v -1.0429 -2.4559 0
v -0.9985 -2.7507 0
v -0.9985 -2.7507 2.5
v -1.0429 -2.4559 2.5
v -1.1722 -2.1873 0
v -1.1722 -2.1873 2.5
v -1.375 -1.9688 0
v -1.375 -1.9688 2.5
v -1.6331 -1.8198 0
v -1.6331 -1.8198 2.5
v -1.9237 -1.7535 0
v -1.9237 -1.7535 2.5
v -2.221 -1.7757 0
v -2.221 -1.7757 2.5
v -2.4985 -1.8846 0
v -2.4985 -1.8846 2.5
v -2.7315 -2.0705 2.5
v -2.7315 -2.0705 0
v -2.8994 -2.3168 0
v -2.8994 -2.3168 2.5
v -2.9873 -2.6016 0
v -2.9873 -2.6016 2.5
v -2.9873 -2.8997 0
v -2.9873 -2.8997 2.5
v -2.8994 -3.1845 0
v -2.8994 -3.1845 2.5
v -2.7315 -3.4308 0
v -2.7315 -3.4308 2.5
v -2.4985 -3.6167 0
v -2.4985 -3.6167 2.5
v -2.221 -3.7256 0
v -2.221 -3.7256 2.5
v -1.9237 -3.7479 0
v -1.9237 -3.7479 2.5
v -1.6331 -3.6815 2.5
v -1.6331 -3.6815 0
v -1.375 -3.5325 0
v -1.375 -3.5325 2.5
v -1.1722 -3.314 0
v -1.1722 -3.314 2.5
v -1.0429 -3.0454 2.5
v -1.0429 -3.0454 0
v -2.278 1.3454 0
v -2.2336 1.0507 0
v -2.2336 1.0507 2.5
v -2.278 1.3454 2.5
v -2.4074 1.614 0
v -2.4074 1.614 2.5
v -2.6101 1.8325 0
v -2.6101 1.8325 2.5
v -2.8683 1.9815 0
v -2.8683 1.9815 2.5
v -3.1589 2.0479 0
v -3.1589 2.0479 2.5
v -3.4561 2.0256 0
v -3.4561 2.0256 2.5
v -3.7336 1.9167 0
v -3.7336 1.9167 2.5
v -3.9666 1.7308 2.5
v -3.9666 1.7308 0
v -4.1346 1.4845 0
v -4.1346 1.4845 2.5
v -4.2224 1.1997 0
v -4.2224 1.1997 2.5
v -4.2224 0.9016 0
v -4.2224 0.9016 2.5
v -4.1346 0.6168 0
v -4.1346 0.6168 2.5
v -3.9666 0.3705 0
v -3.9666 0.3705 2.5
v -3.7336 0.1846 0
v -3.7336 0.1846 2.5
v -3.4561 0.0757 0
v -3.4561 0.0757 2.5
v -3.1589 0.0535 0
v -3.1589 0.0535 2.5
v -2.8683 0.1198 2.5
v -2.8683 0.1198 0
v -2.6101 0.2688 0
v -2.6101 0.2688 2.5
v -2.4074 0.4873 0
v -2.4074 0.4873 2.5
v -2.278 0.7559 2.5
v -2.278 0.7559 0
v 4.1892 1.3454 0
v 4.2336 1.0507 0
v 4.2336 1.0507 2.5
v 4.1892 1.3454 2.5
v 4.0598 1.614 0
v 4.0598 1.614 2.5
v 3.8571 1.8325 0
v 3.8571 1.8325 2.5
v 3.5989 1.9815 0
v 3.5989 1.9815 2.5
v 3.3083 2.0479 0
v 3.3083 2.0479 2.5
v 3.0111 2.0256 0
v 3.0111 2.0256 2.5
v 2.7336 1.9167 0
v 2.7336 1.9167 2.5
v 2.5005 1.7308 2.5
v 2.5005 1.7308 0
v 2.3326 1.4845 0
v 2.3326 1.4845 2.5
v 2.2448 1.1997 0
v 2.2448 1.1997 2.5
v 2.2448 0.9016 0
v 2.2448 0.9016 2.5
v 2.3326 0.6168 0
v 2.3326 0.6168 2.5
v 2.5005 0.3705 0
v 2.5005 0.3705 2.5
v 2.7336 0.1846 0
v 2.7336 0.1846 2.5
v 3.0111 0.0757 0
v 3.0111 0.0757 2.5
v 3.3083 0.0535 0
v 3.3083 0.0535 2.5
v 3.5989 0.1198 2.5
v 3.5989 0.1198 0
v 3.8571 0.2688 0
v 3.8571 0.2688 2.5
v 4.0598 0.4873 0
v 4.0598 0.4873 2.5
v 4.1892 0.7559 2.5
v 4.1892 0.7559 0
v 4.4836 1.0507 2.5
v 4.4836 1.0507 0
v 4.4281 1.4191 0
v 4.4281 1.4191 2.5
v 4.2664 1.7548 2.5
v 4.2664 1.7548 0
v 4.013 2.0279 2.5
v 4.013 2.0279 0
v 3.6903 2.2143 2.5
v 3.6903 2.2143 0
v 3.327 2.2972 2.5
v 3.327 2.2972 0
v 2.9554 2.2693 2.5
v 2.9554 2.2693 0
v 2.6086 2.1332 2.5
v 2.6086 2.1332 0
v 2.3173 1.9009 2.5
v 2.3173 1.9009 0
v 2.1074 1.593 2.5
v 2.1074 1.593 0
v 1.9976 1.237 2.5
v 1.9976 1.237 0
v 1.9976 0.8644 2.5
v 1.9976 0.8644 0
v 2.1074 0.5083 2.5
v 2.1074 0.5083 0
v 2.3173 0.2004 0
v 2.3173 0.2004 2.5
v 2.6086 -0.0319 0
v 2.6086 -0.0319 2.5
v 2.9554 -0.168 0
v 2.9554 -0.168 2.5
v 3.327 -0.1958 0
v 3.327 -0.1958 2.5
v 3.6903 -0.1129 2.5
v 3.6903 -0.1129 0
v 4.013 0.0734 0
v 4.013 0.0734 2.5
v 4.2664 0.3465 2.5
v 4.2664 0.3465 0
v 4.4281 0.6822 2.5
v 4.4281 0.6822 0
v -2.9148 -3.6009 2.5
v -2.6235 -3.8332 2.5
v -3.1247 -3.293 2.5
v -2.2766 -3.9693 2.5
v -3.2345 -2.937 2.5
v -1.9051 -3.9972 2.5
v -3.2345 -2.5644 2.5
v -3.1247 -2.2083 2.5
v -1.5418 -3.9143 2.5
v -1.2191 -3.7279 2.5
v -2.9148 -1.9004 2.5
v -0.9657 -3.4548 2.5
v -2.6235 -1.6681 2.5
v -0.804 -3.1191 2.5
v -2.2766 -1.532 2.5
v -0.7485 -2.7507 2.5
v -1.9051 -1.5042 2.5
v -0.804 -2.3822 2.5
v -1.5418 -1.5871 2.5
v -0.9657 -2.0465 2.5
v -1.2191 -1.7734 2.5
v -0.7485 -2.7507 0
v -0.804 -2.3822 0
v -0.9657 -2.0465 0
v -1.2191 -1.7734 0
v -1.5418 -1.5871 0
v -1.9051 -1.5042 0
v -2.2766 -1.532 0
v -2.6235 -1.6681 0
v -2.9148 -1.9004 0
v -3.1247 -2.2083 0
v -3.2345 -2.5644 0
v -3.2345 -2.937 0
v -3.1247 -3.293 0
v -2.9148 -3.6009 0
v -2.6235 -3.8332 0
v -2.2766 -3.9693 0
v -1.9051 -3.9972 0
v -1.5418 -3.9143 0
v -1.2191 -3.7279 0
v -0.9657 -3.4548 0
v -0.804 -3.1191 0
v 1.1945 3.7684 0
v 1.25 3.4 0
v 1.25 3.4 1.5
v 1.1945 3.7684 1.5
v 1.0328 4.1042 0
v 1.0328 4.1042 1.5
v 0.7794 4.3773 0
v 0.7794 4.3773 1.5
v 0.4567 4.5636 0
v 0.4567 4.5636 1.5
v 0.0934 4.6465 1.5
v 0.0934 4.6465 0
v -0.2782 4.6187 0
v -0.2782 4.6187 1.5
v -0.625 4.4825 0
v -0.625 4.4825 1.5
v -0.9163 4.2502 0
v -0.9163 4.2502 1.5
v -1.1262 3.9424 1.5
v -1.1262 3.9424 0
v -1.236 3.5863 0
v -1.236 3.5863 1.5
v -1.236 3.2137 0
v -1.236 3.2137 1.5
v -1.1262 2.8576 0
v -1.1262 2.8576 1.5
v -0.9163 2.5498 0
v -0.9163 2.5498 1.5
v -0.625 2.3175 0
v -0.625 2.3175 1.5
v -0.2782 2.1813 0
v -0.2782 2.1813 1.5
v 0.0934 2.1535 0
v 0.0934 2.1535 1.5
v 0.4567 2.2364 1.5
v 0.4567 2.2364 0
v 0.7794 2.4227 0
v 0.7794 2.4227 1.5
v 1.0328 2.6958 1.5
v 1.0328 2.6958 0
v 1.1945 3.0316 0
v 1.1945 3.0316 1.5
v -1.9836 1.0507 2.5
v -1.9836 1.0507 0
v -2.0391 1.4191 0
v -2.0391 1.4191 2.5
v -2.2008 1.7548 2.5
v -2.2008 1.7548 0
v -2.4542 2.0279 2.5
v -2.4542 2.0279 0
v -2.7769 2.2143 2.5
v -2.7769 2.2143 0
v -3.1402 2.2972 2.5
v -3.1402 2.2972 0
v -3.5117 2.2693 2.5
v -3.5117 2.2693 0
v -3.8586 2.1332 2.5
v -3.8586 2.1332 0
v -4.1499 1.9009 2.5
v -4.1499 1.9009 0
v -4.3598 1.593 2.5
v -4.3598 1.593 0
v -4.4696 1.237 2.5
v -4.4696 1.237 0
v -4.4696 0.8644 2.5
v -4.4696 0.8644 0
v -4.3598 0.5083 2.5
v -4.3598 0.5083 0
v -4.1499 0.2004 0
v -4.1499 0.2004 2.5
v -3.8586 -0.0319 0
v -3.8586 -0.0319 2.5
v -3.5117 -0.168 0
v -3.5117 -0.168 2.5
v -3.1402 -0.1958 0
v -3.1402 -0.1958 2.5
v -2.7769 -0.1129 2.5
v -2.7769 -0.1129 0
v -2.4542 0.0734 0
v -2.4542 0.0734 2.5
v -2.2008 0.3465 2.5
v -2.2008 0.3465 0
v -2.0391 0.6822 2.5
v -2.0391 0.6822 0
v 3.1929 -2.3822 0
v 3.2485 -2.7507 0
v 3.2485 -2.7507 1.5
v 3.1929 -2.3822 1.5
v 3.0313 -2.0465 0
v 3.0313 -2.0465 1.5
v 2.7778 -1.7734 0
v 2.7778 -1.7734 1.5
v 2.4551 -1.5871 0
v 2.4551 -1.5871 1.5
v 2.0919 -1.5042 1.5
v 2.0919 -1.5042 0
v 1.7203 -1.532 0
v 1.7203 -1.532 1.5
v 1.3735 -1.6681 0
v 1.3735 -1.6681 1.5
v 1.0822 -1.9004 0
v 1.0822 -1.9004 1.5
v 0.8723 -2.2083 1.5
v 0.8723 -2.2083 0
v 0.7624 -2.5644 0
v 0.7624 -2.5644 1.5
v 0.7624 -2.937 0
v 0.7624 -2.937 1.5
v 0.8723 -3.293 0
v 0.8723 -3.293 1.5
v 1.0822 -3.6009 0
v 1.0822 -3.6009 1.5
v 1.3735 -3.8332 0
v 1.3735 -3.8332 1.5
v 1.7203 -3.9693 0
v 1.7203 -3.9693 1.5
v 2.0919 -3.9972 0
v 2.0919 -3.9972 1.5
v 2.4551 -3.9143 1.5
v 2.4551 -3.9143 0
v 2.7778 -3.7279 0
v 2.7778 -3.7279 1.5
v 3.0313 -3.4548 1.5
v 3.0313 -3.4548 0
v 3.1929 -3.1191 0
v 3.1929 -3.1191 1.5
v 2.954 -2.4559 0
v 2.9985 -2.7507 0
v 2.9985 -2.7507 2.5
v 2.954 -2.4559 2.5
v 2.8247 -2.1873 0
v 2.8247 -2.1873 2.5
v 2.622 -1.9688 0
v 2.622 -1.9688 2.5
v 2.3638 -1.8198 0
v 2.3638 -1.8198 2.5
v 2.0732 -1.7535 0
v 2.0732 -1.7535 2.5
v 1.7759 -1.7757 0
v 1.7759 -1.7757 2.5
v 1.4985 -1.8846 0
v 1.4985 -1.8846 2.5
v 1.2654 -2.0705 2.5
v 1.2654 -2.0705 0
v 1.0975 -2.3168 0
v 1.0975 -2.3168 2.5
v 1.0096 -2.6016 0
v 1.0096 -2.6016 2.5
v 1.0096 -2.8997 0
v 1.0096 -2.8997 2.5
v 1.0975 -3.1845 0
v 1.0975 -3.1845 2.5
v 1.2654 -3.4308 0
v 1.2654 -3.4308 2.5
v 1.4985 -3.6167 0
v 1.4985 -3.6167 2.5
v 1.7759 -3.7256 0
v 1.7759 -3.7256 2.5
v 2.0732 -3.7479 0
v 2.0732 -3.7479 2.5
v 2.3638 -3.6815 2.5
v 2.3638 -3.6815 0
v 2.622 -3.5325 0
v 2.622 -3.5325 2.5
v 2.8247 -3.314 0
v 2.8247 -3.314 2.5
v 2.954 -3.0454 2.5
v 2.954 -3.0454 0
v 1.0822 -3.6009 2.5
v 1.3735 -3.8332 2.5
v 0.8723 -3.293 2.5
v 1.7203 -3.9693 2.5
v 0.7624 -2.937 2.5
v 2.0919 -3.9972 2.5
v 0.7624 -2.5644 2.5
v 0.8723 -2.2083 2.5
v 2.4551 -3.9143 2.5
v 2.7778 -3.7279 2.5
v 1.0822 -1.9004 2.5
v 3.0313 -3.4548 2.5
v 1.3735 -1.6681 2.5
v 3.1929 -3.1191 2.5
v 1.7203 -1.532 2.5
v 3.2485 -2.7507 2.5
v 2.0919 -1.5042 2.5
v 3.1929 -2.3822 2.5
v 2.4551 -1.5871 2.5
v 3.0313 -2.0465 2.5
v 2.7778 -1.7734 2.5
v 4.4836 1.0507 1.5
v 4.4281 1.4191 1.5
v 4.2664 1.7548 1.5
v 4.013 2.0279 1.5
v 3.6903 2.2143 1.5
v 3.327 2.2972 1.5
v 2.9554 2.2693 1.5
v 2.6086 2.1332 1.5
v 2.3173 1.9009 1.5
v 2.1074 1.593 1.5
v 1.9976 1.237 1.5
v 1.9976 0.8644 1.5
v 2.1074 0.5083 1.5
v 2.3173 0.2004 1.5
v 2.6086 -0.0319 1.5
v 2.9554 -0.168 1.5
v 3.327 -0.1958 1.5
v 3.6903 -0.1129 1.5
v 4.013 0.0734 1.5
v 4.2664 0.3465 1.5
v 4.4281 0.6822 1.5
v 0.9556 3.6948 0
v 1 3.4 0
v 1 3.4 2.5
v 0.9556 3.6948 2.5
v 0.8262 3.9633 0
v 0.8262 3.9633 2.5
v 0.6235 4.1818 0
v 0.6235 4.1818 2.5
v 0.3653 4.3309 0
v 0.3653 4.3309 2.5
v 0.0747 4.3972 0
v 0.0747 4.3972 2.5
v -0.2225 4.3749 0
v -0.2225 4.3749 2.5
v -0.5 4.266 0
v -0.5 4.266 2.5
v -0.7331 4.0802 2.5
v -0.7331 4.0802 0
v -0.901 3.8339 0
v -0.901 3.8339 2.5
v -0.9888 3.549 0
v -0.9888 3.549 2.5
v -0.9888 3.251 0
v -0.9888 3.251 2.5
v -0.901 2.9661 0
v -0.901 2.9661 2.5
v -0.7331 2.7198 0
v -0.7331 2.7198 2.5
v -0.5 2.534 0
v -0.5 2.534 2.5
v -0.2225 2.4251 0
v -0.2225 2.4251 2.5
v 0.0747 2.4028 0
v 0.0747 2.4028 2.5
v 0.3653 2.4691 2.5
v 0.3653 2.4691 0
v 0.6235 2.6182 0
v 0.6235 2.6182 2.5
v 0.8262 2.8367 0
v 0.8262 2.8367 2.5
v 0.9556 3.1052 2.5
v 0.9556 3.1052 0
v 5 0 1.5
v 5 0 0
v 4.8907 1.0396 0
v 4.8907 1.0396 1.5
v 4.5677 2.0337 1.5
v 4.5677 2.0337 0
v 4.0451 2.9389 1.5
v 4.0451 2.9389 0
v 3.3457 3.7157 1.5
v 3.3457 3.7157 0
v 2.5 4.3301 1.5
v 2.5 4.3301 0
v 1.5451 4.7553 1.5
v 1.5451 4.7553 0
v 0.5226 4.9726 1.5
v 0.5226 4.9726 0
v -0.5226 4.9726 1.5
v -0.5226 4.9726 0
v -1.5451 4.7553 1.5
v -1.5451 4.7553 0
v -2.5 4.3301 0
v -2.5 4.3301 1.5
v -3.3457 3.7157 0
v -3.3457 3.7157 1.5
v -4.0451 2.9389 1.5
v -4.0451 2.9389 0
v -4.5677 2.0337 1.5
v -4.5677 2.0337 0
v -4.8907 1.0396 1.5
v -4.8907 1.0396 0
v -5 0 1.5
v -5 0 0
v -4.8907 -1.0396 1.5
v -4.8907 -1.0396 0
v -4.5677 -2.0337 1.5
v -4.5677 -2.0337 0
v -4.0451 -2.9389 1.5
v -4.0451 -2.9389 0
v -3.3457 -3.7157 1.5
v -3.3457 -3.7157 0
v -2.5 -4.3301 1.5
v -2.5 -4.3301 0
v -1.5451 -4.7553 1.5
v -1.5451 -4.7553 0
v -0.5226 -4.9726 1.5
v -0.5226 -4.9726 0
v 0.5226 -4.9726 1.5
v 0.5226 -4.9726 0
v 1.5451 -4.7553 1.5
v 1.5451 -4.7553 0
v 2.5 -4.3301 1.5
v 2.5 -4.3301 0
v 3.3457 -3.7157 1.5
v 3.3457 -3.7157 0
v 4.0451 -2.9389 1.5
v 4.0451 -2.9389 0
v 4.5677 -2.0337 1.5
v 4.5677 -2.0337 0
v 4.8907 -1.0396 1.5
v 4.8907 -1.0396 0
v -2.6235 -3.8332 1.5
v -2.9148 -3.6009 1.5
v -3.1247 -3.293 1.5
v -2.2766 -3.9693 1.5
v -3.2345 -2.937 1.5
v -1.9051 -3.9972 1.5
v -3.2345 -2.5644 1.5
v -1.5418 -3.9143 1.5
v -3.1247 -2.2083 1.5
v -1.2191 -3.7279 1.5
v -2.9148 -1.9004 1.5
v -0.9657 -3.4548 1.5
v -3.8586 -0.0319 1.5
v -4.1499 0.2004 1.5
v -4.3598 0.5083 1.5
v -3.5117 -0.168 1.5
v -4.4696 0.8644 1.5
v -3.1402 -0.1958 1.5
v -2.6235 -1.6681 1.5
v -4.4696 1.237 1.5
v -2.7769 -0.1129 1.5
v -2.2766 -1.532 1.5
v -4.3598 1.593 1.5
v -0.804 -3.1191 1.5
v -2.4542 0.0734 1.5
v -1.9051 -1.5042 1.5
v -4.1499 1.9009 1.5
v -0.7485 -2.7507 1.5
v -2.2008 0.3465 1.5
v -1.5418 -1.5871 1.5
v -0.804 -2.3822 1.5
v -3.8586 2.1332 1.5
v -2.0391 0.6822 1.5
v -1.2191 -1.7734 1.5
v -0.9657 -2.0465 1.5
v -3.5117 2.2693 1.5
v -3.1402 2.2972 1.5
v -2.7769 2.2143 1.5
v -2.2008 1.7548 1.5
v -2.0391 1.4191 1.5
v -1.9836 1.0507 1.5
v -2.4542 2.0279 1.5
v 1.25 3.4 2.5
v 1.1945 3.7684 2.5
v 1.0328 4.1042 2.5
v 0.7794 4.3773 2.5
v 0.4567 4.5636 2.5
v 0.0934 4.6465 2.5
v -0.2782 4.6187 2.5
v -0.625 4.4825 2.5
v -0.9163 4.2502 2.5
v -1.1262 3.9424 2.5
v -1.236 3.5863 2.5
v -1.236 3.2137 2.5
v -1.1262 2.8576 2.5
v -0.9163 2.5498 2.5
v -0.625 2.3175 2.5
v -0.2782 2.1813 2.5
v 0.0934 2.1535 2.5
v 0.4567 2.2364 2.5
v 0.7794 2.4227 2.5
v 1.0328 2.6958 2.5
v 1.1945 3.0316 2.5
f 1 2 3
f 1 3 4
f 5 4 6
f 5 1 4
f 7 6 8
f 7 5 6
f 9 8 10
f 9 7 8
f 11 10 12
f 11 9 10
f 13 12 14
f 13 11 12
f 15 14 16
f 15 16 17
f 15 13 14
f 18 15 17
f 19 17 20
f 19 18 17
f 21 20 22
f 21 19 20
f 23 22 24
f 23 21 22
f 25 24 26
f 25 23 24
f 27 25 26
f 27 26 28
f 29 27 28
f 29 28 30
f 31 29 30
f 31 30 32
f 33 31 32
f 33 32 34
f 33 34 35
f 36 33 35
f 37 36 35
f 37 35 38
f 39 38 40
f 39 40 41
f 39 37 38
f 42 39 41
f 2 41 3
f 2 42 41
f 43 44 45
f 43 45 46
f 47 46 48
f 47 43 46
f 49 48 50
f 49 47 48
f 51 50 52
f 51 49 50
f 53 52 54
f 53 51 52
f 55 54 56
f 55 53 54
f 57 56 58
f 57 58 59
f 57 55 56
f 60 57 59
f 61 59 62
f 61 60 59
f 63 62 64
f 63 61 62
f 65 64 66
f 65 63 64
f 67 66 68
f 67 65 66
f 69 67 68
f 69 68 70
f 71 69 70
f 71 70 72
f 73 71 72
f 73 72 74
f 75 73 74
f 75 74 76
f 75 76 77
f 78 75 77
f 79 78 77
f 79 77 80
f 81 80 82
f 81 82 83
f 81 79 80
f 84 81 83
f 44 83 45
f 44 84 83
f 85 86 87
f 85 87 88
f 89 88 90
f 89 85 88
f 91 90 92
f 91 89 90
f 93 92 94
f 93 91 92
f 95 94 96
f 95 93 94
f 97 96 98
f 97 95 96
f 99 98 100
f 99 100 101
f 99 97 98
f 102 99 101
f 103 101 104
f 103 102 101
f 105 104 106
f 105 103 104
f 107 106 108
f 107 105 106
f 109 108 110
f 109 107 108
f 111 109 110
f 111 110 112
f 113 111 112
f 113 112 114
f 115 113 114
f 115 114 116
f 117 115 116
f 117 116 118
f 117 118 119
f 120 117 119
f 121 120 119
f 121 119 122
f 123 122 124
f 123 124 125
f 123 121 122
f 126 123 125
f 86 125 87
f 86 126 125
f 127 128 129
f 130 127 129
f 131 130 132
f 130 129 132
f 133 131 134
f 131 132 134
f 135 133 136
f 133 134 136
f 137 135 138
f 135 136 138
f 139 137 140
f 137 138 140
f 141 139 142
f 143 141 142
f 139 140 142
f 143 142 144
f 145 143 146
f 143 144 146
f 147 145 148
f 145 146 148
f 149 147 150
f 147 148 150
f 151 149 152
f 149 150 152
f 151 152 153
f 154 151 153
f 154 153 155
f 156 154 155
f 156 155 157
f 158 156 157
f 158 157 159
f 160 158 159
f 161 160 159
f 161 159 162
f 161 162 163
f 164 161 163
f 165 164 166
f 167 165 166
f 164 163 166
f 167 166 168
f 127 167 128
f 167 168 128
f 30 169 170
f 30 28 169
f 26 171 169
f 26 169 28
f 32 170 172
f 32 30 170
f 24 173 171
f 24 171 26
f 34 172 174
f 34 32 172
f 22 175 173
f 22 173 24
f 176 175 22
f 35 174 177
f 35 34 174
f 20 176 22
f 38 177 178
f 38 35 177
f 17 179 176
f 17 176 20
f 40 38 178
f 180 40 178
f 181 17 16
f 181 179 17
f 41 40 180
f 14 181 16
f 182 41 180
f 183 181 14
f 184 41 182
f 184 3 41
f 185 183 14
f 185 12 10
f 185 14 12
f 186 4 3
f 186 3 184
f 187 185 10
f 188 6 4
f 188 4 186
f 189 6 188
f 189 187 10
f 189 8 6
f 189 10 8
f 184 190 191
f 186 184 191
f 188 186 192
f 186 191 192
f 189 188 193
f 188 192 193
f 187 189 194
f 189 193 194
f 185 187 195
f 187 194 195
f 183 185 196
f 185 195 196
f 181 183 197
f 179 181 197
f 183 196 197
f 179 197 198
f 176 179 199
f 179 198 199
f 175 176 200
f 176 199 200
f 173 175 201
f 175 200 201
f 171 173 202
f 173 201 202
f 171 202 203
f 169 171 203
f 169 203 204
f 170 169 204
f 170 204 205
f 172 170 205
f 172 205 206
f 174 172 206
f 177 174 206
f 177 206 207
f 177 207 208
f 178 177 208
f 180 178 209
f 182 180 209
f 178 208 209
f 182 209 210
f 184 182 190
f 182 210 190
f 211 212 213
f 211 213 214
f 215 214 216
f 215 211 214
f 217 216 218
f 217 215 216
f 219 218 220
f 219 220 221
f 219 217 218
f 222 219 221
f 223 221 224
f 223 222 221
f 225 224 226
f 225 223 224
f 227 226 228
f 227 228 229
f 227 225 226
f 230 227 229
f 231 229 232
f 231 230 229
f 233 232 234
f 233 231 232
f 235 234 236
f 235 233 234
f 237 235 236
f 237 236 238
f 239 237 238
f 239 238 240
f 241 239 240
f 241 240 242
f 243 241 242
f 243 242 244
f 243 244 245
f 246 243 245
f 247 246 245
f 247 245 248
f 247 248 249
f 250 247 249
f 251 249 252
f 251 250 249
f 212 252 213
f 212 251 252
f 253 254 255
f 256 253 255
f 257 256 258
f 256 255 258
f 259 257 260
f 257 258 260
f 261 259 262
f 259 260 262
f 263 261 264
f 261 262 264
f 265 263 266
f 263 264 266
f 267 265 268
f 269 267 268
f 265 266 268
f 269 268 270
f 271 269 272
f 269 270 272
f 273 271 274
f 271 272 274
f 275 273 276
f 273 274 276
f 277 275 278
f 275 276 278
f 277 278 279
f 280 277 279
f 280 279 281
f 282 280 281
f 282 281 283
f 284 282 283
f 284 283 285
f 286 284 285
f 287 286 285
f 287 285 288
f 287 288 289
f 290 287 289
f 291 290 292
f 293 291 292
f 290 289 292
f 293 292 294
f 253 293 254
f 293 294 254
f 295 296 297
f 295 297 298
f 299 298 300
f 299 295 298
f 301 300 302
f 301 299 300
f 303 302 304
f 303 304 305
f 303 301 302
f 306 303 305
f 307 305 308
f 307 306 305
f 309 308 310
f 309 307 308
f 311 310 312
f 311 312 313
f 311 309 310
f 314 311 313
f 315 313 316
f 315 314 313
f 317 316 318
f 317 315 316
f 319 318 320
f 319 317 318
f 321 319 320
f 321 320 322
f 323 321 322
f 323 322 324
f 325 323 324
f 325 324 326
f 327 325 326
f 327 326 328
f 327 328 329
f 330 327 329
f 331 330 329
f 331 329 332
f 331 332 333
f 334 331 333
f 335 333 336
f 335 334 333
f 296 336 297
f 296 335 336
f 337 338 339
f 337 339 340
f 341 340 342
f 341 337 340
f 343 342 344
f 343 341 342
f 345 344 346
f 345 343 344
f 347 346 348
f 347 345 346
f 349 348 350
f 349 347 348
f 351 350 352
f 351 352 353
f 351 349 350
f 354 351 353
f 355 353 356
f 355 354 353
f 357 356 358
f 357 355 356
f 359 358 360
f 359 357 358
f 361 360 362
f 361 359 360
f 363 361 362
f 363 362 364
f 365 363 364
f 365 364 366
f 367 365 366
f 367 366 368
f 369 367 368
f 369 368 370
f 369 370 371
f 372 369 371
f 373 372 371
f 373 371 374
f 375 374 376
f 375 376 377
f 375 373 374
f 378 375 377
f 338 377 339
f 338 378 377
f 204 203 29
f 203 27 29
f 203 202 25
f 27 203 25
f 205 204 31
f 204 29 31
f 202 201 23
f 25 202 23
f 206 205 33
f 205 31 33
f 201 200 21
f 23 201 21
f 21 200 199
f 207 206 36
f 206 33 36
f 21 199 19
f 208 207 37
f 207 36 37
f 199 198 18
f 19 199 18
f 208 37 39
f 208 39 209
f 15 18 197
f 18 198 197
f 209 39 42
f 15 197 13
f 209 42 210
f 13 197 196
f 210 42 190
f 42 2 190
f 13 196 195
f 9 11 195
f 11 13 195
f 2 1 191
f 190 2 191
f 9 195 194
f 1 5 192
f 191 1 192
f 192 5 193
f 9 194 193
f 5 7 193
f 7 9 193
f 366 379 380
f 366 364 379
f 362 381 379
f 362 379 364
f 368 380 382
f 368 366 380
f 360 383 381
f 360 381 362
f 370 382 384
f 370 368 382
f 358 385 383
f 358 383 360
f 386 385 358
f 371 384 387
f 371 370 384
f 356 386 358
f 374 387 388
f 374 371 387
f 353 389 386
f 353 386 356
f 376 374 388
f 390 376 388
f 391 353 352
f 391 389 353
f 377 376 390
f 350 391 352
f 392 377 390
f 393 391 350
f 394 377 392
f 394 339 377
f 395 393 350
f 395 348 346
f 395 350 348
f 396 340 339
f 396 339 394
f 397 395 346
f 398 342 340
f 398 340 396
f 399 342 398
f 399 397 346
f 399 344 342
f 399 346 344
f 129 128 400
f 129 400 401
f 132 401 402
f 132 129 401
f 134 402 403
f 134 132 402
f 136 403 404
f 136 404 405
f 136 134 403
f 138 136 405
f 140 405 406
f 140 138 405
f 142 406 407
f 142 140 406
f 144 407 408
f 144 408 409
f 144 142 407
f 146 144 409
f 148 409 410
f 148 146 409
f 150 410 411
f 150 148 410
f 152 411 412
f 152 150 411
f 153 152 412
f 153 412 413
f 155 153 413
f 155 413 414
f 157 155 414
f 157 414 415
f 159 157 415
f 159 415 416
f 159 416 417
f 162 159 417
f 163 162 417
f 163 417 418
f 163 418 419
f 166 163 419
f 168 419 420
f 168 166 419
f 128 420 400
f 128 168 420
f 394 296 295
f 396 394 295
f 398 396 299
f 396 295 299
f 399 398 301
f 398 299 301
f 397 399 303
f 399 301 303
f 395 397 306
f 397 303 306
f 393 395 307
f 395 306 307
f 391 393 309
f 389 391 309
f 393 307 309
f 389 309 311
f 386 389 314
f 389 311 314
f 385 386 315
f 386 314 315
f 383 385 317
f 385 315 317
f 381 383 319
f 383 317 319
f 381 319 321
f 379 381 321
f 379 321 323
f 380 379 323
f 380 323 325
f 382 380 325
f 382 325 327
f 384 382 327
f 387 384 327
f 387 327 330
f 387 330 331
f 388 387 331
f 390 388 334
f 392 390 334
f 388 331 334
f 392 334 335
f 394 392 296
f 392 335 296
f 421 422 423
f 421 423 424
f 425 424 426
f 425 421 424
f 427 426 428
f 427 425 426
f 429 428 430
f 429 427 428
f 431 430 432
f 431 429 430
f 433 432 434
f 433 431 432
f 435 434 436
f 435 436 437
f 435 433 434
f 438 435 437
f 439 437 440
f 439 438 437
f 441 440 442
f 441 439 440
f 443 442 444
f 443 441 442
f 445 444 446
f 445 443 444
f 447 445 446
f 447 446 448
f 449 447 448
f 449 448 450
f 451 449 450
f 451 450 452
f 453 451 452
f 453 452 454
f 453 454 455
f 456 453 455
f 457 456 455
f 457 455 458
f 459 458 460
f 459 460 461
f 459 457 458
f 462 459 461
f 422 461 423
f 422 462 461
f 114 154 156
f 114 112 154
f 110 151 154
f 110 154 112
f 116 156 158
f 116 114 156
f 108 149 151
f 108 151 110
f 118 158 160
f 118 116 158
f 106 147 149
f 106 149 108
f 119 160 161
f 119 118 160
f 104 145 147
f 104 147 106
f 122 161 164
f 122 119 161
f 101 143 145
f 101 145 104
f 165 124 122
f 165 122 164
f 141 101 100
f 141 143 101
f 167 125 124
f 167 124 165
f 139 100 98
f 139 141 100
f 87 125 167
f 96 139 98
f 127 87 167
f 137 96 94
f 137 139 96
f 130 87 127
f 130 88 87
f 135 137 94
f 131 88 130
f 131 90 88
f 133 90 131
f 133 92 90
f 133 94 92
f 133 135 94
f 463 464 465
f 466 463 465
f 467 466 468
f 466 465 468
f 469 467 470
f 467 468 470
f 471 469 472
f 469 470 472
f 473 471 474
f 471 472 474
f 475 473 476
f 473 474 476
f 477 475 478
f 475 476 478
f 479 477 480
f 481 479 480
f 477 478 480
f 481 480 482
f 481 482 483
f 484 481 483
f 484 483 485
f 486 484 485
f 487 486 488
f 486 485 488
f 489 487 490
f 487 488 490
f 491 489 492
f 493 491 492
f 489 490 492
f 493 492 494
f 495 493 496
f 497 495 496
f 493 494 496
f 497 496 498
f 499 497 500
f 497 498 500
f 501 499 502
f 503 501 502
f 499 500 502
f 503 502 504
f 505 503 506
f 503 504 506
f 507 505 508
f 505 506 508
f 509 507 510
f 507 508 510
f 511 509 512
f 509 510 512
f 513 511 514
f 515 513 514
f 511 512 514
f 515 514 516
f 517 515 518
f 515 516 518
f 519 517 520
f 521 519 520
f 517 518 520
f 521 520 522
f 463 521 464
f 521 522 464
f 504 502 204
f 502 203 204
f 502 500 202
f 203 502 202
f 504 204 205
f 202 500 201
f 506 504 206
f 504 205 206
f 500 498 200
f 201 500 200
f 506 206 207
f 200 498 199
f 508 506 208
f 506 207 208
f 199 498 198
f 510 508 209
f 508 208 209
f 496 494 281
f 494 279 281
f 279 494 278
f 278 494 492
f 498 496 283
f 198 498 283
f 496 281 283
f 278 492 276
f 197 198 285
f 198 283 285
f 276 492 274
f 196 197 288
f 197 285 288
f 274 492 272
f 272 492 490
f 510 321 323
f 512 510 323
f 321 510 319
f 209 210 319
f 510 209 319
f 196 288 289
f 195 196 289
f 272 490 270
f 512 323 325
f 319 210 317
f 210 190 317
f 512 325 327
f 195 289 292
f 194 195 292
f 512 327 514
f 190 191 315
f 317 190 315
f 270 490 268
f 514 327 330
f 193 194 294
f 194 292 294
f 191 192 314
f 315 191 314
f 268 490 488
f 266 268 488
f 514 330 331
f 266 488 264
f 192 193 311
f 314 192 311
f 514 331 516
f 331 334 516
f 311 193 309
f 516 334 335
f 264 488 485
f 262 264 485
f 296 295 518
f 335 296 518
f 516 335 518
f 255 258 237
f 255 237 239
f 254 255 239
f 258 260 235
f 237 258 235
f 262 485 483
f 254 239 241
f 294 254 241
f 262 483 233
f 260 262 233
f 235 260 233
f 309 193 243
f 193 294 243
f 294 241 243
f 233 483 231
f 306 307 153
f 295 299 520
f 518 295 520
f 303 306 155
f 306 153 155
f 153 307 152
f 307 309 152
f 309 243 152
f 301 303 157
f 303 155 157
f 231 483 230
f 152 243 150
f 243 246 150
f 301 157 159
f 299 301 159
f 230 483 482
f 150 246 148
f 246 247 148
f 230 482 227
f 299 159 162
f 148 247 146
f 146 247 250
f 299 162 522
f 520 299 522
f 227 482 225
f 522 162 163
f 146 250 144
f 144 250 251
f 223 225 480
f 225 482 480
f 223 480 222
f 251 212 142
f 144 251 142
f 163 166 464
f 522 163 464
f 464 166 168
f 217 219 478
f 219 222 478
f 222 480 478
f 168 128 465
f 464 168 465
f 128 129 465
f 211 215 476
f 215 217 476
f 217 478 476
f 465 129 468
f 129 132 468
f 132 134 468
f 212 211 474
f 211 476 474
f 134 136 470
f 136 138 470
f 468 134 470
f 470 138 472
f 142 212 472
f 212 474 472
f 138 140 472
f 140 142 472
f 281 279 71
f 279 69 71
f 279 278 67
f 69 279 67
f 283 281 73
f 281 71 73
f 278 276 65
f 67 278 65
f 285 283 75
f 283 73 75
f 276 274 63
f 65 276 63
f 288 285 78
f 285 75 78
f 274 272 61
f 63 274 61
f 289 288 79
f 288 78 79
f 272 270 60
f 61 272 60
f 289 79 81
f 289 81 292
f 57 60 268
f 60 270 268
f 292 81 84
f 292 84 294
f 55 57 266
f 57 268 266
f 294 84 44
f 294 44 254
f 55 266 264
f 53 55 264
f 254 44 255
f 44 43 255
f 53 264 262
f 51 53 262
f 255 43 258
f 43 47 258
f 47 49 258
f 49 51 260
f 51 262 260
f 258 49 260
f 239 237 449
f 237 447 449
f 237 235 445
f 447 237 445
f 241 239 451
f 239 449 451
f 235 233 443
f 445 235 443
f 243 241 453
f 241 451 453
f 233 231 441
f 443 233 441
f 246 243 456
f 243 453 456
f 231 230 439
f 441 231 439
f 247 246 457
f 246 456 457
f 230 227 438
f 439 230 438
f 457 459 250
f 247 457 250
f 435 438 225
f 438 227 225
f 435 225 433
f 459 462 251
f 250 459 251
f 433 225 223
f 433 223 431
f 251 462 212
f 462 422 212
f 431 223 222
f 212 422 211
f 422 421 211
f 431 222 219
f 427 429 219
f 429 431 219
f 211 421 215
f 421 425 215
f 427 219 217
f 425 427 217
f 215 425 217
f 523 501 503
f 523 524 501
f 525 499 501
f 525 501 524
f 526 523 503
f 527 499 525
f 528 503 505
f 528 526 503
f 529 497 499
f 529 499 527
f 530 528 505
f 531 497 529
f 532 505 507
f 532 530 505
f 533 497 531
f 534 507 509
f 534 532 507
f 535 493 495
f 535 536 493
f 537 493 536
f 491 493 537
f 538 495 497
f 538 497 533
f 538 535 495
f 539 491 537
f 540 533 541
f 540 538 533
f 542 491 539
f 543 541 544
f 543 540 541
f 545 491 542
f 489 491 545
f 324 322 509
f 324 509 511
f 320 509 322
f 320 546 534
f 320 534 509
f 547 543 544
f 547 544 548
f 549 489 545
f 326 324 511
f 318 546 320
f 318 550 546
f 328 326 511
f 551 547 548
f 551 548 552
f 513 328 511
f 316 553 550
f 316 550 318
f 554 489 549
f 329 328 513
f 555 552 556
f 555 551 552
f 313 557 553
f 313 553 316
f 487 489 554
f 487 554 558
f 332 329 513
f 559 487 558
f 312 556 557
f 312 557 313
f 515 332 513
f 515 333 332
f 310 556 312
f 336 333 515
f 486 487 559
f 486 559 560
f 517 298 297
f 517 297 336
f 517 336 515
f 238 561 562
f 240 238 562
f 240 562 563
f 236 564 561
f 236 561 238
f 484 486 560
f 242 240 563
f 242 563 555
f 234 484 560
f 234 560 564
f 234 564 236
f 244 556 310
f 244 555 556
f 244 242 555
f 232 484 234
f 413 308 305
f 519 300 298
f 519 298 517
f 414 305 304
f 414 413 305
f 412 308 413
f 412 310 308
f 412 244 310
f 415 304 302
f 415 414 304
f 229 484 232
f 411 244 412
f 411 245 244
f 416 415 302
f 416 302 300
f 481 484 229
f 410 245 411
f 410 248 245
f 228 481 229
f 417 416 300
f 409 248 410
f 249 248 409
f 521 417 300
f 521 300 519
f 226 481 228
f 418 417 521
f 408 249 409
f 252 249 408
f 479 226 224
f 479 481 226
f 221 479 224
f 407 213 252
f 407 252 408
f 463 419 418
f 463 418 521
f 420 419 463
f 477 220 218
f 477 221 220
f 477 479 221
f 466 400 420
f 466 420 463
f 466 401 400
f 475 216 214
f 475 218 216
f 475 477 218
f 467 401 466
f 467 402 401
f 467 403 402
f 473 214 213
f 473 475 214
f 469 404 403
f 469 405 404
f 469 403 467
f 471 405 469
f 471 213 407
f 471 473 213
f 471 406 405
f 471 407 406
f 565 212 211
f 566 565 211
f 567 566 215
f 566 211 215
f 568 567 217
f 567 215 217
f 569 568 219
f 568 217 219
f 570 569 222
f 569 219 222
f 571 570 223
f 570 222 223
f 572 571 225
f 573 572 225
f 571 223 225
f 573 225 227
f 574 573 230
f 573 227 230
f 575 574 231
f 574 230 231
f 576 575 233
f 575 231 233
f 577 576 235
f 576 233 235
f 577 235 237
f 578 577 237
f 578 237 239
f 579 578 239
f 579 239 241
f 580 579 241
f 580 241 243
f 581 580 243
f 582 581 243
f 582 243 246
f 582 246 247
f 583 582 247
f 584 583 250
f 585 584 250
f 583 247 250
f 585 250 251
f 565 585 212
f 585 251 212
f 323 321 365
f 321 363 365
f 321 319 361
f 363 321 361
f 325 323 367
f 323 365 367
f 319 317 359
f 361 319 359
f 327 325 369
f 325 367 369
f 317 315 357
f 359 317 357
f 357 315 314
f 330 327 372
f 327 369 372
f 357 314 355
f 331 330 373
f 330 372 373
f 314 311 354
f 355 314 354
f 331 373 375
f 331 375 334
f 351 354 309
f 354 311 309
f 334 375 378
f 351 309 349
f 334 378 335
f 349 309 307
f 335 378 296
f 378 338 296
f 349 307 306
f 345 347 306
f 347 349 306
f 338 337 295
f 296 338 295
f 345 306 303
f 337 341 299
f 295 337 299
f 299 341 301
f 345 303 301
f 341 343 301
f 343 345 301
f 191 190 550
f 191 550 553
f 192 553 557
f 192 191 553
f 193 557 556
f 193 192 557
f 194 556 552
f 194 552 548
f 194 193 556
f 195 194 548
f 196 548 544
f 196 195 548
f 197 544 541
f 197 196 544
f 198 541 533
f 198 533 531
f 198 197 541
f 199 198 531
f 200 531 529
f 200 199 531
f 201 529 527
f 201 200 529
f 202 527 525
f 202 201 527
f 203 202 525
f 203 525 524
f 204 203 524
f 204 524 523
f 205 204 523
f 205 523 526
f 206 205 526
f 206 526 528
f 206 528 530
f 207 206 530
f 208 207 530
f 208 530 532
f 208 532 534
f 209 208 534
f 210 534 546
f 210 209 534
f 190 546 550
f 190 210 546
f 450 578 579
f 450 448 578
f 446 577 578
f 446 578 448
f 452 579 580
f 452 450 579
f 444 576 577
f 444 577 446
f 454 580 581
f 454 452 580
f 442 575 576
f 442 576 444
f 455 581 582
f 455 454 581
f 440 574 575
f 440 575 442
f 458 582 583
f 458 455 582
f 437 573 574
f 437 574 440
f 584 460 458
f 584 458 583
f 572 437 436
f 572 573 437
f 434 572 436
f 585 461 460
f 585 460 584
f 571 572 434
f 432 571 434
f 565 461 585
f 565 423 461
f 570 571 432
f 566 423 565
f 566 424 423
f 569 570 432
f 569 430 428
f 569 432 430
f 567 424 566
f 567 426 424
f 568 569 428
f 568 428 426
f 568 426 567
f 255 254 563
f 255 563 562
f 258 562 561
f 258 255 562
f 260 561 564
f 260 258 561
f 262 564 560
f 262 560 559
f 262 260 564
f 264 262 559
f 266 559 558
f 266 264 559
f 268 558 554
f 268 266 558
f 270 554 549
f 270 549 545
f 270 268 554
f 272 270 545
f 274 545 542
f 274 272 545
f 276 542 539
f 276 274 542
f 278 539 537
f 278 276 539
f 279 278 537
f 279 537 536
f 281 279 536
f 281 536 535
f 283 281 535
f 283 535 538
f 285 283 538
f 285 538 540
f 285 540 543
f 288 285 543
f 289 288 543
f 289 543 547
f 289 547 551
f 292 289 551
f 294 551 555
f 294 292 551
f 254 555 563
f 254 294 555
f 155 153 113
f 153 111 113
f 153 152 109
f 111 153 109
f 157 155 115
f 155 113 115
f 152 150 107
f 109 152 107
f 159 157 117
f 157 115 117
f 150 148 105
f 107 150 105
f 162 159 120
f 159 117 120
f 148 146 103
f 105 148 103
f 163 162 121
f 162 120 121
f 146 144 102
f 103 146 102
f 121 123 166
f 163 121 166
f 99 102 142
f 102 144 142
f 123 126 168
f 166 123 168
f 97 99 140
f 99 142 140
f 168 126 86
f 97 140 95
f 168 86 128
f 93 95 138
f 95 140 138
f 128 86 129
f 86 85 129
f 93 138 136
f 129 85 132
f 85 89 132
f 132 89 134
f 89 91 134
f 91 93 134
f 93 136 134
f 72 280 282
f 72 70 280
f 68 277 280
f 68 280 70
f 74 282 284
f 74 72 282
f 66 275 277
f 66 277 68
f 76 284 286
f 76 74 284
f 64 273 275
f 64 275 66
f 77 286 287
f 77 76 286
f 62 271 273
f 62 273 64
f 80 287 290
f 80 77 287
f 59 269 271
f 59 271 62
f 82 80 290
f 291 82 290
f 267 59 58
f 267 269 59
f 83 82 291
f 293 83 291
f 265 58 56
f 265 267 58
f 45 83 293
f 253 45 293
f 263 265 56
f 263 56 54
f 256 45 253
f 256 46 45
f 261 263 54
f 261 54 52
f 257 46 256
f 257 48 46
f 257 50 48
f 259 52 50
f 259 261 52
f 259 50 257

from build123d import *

# Parameters (mm, degrees)
F0_R     = 1.25
F0_R_2   = 1
F1_DEPTH = 2.5
F0_R_3   = 5
F2_DEPTH = 1.5


with BuildPart() as f1:
    # F0 (on Top) → F1 (new body)
    with BuildSketch(Plane.XY):
        with Locations((-1.99847, -2.750658)):
            Circle(F0_R)
        with Locations((-1.99847, -2.750658)):
            Circle(F0_R_2, mode=Mode.SUBTRACT)
        with Locations((-3.233592, 1.050658)):
            Circle(F0_R)
        with Locations((-3.233592, 1.050658)):
            Circle(F0_R_2, mode=Mode.SUBTRACT)
        with Locations((1.99847, -2.750658)):
            Circle(F0_R)
        with Locations((1.99847, -2.750658)):
            Circle(F0_R_2, mode=Mode.SUBTRACT)
        with Locations((3.233592, 1.050658)):
            Circle(F0_R)
        with Locations((3.233592, 1.050658)):
            Circle(F0_R_2, mode=Mode.SUBTRACT)
        with Locations((0, 3.4)):
            Circle(F0_R)
        with Locations((0, 3.4)):
            Circle(F0_R_2, mode=Mode.SUBTRACT)
    extrude(amount=F1_DEPTH)


with BuildPart() as f2:
    # F0 (on Top) → F2 (new body)
    with BuildSketch(Plane.XY):
        Circle(F0_R_3)
        with Locations((-1.99847, -2.750658)):
            Circle(F0_R, mode=Mode.SUBTRACT)
        with Locations((1.99847, -2.750658)):
            Circle(F0_R, mode=Mode.SUBTRACT)
        with Locations((-3.233592, 1.050658)):
            Circle(F0_R, mode=Mode.SUBTRACT)
        with Locations((3.233592, 1.050658)):
            Circle(F0_R, mode=Mode.SUBTRACT)
        with Locations((0, 3.4)):
            Circle(F0_R, mode=Mode.SUBTRACT)
    extrude(amount=F2_DEPTH)


solid = Compound([f1.part, f2.part])
